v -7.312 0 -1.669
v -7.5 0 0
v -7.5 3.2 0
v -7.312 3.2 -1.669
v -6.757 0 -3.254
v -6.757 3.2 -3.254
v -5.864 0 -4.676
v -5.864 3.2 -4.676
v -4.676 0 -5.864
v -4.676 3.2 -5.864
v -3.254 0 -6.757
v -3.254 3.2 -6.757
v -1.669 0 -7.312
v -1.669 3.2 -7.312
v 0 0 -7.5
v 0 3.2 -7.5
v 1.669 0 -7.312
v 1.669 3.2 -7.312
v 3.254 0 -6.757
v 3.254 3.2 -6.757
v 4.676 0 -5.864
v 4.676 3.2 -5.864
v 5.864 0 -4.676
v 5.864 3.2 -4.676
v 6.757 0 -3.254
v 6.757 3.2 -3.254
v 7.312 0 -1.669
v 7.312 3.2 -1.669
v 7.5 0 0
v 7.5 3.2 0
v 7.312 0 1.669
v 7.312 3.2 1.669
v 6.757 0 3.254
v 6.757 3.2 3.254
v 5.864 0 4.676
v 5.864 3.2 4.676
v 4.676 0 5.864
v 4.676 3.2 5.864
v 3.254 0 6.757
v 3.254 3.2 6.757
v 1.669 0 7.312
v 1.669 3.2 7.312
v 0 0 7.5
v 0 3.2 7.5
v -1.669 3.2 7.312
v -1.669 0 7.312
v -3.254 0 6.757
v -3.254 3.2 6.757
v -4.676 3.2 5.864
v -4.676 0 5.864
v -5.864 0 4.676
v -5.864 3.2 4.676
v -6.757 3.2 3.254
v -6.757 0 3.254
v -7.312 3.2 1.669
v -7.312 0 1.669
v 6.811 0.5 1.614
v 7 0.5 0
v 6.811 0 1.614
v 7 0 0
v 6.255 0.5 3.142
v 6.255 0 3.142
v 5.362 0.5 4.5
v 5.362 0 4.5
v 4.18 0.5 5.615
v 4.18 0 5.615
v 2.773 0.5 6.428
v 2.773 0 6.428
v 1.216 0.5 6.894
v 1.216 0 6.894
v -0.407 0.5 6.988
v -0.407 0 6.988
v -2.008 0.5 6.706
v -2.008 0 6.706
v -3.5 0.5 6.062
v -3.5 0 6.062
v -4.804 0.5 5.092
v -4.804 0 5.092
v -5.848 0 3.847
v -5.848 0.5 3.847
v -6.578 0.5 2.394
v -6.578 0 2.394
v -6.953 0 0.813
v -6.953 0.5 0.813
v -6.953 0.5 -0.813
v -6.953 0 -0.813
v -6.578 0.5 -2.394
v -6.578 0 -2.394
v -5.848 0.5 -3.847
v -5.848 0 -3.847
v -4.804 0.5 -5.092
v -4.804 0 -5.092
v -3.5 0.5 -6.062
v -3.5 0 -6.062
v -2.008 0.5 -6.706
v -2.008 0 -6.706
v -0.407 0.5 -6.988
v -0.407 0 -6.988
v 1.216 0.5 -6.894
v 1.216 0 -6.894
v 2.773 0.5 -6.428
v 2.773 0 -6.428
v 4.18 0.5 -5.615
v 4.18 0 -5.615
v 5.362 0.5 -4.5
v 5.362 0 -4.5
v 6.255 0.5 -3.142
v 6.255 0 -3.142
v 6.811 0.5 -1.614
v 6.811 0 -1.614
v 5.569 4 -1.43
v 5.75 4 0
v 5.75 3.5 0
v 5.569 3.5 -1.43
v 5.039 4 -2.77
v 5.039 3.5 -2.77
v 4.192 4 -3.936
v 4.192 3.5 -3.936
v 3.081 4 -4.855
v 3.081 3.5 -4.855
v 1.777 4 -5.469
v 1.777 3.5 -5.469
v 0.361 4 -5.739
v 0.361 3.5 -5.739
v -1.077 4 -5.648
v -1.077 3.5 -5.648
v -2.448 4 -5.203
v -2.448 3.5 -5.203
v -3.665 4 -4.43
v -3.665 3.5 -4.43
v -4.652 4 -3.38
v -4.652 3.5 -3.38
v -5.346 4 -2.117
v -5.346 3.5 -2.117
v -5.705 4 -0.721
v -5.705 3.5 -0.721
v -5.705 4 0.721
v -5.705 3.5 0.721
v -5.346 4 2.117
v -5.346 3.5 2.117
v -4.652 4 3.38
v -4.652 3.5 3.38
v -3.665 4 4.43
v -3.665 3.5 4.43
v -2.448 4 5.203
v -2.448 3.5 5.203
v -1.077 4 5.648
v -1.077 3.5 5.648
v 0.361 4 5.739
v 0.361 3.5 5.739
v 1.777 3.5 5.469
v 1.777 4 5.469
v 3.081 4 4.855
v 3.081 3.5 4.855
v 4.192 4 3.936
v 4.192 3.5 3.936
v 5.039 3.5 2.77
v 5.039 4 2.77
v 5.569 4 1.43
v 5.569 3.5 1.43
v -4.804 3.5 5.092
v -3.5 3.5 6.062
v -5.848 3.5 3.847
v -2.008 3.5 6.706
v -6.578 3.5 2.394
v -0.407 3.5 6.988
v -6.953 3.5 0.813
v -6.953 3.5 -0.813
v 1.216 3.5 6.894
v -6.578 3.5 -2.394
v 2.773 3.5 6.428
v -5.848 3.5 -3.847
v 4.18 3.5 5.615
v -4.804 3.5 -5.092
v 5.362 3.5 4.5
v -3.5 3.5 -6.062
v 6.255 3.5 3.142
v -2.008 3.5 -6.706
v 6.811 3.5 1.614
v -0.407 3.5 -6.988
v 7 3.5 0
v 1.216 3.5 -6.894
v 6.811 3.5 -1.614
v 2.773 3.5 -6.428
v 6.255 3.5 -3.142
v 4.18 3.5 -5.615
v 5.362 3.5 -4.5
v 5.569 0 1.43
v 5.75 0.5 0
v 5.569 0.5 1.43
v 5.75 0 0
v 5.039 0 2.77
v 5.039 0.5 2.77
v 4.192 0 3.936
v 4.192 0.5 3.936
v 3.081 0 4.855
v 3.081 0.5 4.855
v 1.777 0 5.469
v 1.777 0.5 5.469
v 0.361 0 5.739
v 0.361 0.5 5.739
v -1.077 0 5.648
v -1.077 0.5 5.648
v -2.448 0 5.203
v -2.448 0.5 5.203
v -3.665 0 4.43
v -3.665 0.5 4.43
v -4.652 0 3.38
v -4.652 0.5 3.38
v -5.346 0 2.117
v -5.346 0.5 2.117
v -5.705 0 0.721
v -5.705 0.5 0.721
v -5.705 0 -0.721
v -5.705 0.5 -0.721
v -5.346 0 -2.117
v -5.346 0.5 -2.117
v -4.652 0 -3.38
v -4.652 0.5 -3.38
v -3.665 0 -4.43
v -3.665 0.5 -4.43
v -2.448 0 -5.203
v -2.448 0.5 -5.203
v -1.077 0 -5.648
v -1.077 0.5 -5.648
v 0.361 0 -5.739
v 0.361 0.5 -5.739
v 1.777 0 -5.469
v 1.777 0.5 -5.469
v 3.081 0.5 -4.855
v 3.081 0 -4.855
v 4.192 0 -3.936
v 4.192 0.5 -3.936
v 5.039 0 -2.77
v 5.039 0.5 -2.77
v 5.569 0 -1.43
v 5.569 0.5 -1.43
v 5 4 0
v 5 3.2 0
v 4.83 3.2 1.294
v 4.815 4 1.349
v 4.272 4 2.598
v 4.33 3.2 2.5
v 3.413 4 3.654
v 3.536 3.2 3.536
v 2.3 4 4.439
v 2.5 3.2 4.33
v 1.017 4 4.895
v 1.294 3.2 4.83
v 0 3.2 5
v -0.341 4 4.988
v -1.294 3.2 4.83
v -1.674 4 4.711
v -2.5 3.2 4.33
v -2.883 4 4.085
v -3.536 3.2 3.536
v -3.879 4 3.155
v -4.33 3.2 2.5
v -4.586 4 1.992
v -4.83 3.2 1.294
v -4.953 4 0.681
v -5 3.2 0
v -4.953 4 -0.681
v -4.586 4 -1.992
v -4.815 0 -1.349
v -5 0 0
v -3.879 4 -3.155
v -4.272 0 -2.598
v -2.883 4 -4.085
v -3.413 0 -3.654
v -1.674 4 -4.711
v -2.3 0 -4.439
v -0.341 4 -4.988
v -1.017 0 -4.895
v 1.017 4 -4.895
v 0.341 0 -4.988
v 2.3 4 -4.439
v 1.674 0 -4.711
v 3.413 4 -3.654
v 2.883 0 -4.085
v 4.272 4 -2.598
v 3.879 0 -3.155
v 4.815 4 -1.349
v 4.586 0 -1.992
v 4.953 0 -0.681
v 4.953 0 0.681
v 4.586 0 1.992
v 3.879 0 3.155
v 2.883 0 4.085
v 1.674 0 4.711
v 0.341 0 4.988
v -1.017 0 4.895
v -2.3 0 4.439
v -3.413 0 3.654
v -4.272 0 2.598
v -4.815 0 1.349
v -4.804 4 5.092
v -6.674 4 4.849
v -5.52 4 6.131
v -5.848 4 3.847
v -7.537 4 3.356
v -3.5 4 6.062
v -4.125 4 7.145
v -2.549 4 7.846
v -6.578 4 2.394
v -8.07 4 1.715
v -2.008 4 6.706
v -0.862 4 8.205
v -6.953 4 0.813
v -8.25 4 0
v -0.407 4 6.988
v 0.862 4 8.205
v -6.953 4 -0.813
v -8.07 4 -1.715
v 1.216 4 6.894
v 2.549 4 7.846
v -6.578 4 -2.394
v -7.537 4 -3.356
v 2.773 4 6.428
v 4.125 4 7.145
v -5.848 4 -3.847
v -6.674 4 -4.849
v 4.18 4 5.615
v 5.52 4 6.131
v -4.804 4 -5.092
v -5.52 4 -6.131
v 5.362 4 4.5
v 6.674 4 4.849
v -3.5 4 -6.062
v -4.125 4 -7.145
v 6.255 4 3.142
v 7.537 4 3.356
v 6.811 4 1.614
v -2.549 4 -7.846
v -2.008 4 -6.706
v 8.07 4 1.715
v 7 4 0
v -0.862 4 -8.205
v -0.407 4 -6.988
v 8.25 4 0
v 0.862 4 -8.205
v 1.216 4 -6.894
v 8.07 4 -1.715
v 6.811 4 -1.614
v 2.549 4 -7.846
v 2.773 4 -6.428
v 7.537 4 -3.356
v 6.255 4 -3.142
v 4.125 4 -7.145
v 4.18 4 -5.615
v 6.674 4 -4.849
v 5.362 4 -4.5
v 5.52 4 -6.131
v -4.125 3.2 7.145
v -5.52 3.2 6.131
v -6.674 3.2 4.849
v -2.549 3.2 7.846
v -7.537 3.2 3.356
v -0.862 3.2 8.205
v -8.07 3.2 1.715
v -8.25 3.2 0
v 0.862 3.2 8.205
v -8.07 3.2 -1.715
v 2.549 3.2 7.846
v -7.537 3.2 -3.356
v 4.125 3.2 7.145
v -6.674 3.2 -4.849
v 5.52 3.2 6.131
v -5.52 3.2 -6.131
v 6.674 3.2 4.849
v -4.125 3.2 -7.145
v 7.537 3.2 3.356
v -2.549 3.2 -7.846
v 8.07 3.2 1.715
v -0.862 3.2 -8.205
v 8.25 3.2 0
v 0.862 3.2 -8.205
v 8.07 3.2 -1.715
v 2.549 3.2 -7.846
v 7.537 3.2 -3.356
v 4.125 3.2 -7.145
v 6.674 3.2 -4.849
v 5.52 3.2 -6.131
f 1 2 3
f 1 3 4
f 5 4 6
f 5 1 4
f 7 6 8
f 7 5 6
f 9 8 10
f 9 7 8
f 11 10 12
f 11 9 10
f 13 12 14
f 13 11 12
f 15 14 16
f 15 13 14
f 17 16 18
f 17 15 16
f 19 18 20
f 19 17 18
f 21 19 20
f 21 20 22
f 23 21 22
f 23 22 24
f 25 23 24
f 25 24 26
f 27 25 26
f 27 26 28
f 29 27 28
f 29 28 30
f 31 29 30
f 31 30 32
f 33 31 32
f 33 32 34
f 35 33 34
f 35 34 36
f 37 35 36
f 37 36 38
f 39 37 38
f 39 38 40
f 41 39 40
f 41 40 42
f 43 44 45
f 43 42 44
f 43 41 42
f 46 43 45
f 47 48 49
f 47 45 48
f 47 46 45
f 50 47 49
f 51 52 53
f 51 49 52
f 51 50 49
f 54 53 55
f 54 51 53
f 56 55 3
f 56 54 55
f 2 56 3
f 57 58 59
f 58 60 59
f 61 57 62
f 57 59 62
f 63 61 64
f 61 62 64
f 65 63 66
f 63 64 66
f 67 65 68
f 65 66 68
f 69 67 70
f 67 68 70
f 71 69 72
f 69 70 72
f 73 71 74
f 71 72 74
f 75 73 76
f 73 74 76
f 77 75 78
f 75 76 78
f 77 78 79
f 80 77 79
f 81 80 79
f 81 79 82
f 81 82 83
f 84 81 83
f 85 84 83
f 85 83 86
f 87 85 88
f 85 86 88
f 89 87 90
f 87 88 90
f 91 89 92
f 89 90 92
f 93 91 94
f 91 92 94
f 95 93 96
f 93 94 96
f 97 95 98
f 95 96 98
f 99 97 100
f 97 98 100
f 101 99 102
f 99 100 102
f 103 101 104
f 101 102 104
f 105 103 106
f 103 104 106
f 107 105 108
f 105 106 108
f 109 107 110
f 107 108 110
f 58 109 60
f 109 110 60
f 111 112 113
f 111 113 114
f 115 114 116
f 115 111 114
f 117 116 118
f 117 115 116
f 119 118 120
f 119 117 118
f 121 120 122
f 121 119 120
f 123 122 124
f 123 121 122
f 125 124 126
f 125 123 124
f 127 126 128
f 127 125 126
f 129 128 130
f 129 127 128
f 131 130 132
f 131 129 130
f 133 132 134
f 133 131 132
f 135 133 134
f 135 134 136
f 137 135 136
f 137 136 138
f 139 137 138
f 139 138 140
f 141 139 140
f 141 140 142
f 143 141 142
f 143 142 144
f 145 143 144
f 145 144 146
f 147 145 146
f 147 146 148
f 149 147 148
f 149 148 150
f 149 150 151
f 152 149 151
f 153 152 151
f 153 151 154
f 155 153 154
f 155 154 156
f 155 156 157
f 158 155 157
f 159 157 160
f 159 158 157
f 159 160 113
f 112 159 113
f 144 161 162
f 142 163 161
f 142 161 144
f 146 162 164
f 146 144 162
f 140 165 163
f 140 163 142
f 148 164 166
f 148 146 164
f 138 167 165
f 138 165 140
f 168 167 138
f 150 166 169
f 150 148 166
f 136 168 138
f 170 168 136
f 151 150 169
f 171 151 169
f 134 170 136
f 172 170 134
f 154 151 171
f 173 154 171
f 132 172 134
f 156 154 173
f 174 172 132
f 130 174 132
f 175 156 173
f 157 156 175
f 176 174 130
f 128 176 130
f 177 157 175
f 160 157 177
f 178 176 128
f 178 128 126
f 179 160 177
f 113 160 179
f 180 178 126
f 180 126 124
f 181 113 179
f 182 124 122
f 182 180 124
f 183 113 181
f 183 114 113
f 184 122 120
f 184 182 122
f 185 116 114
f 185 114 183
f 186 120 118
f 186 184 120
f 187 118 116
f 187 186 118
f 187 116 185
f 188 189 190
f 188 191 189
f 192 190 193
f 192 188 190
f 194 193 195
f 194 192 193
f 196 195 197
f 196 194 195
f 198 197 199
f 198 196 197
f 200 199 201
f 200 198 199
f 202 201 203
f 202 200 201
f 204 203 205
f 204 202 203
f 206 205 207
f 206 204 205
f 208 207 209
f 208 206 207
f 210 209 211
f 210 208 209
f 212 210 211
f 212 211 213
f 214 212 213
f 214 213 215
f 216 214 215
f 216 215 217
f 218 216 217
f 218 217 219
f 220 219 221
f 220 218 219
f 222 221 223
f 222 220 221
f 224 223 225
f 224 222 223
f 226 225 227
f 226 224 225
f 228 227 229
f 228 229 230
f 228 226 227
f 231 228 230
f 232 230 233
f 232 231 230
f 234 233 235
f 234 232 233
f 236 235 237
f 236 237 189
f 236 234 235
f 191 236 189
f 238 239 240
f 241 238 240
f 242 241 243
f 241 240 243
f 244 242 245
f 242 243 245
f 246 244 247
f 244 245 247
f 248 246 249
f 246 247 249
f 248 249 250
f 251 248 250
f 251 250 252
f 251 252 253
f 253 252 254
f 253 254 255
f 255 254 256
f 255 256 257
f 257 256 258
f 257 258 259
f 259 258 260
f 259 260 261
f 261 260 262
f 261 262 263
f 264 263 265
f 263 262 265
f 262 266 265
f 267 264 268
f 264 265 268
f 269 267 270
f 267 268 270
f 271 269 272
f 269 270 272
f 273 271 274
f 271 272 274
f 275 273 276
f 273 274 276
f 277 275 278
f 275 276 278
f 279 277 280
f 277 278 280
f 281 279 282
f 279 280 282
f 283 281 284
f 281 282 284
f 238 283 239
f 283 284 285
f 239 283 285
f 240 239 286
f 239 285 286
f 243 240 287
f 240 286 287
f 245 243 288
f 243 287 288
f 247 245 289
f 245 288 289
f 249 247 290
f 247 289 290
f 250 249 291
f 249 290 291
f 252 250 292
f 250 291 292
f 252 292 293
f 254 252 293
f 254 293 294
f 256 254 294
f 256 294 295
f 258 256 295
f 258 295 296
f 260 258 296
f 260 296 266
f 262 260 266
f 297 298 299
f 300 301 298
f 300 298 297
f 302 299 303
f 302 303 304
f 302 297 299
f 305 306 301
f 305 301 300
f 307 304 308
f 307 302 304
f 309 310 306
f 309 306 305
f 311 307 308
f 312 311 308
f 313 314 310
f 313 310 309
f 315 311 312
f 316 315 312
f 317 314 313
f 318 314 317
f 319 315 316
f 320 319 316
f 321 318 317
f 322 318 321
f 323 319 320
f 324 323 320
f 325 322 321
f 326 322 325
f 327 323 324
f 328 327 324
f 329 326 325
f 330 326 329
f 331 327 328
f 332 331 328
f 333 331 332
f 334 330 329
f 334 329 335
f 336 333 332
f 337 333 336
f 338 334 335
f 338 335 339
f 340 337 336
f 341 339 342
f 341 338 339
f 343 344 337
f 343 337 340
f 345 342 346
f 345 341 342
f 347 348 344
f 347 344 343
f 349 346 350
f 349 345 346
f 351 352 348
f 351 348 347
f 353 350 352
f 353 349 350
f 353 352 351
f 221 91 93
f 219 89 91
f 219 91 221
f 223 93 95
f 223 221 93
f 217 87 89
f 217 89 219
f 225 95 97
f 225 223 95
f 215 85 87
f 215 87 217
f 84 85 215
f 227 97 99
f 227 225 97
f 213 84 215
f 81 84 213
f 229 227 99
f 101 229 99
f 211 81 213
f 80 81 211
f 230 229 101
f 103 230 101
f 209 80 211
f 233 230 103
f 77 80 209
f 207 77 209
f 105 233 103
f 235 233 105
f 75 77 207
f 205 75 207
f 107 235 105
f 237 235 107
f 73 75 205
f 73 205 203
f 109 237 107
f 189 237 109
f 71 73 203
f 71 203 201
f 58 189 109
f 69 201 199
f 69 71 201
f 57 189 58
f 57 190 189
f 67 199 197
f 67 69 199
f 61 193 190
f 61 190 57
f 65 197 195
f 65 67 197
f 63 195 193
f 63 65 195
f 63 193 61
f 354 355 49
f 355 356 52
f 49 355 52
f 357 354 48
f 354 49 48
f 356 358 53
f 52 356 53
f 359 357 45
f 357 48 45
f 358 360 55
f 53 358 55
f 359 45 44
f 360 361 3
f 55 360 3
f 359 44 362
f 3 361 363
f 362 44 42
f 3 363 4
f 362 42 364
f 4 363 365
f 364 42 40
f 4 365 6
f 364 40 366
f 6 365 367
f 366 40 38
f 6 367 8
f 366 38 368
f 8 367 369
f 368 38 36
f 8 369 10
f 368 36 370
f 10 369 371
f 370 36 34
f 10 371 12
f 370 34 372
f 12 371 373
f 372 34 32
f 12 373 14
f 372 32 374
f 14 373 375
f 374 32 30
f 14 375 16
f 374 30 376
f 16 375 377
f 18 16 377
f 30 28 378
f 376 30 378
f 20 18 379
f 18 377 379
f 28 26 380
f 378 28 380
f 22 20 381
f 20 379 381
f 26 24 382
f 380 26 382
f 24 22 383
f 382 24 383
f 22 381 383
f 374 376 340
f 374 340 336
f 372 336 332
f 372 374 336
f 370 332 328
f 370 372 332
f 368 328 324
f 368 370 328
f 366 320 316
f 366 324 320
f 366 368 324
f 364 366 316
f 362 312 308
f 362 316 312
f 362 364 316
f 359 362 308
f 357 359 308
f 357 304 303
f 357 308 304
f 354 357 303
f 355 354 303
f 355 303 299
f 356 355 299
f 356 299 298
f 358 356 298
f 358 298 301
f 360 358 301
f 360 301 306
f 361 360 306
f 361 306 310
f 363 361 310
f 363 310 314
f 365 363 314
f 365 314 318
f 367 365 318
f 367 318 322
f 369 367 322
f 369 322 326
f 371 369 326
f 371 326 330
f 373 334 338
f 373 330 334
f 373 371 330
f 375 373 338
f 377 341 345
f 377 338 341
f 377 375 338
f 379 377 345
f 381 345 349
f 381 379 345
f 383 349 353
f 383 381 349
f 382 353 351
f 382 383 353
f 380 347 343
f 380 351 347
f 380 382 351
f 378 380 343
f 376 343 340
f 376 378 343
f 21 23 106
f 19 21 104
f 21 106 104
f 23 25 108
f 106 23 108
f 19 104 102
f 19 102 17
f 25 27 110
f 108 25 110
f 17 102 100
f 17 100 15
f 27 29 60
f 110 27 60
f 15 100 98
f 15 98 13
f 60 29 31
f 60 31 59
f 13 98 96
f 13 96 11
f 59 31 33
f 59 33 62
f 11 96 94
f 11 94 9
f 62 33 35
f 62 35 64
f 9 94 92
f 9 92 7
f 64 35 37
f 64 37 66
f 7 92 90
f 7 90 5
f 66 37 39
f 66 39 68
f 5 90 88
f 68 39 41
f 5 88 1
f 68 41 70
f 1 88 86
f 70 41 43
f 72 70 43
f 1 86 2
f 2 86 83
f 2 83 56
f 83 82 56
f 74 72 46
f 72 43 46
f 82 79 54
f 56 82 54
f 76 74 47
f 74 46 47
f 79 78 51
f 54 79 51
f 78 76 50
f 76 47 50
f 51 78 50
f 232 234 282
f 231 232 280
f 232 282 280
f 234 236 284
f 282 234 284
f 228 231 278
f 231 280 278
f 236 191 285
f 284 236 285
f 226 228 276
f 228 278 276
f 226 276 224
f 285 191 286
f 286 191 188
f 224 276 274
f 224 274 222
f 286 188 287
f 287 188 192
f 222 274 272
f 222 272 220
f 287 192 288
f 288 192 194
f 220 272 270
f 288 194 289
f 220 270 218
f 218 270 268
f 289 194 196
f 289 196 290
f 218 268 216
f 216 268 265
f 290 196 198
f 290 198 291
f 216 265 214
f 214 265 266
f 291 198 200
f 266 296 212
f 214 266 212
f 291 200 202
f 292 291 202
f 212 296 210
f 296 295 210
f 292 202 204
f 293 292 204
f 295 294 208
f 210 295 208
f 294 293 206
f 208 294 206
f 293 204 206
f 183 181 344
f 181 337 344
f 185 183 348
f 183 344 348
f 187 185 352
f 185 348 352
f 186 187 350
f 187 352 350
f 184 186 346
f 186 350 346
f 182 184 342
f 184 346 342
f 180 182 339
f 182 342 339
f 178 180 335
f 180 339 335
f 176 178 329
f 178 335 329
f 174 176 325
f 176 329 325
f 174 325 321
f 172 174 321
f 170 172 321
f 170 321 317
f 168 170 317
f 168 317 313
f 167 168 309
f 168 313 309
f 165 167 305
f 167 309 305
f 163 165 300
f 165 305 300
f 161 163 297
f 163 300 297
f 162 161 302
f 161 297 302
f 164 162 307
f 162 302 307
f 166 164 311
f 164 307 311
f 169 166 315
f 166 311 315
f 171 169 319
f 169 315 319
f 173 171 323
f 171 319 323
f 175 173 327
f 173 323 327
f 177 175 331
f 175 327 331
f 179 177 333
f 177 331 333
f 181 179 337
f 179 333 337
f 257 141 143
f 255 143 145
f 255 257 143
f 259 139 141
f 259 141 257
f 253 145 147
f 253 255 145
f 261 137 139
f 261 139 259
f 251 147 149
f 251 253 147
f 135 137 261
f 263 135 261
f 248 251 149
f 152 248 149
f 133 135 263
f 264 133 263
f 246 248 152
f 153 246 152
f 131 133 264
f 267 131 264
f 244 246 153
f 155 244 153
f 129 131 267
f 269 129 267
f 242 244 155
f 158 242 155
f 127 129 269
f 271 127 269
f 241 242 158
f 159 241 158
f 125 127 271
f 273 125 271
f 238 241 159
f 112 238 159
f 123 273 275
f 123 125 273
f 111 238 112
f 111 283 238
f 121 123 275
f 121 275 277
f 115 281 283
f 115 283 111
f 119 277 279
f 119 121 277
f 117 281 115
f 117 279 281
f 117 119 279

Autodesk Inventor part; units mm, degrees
ref_plane "YZ Plane" through (0, 0, 0) normal (1, 0, 0) x (0, 1, 0)
ref_plane "XZ Plane" through (0, 0, 0) normal (0, 1, 0) x (-1, 0, 0)
ref_plane "XY Plane" through (0, 0, 0) normal (0, 0, 1) x (1, 0, 0)
sketch "Sketch1" plane through (0, 0, 0) normal (0, 1, 0) x (-1, 0, 0)
  circle A0 centre (0, 0) radius 5
  circle A1 centre (0, 0) radius 7.5
  dimension "d0" = 10
  dimension "d1" = 15
extrude "Extrusion1" add sketch "Sketch1" along normal blind 3.2
sketch "Sketch2" plane through (0, 3.2, 0) normal (0, 1, 0) x (1, 0, 0)
  circle A0 centre (0, 0) radius 5 projected
  circle A1 centre (0, 0) radius 8.25
  dimension "d4" = 16.5
extrude "Extrusion2" add sketch "Sketch2" along normal blind 0.8
sketch "Sketch3" plane through (0, 4, 0) normal (0, 1, 0) x (1, 0, 0)
  circle A0 centre (0, 0) radius 5.75
  circle A1 centre (0, 0) radius 7
  dimension "d7" = 11.5
  dimension "d8" = 14
extrude "Extrusion3" cut sketch "Sketch3" against normal blind 0.5
sketch "Sketch4" plane through (0, 0, 0) normal (0, -1, 0) x (1, 0, 0)
  circle A0 centre (0, 0) radius 7 projected
  circle A1 centre (0, 0) radius 5.75 projected
extrude "Extrusion4" cut sketch "Sketch4" against normal blind 0.5
properties part number "10x15x4mm Flanged Bearing"
